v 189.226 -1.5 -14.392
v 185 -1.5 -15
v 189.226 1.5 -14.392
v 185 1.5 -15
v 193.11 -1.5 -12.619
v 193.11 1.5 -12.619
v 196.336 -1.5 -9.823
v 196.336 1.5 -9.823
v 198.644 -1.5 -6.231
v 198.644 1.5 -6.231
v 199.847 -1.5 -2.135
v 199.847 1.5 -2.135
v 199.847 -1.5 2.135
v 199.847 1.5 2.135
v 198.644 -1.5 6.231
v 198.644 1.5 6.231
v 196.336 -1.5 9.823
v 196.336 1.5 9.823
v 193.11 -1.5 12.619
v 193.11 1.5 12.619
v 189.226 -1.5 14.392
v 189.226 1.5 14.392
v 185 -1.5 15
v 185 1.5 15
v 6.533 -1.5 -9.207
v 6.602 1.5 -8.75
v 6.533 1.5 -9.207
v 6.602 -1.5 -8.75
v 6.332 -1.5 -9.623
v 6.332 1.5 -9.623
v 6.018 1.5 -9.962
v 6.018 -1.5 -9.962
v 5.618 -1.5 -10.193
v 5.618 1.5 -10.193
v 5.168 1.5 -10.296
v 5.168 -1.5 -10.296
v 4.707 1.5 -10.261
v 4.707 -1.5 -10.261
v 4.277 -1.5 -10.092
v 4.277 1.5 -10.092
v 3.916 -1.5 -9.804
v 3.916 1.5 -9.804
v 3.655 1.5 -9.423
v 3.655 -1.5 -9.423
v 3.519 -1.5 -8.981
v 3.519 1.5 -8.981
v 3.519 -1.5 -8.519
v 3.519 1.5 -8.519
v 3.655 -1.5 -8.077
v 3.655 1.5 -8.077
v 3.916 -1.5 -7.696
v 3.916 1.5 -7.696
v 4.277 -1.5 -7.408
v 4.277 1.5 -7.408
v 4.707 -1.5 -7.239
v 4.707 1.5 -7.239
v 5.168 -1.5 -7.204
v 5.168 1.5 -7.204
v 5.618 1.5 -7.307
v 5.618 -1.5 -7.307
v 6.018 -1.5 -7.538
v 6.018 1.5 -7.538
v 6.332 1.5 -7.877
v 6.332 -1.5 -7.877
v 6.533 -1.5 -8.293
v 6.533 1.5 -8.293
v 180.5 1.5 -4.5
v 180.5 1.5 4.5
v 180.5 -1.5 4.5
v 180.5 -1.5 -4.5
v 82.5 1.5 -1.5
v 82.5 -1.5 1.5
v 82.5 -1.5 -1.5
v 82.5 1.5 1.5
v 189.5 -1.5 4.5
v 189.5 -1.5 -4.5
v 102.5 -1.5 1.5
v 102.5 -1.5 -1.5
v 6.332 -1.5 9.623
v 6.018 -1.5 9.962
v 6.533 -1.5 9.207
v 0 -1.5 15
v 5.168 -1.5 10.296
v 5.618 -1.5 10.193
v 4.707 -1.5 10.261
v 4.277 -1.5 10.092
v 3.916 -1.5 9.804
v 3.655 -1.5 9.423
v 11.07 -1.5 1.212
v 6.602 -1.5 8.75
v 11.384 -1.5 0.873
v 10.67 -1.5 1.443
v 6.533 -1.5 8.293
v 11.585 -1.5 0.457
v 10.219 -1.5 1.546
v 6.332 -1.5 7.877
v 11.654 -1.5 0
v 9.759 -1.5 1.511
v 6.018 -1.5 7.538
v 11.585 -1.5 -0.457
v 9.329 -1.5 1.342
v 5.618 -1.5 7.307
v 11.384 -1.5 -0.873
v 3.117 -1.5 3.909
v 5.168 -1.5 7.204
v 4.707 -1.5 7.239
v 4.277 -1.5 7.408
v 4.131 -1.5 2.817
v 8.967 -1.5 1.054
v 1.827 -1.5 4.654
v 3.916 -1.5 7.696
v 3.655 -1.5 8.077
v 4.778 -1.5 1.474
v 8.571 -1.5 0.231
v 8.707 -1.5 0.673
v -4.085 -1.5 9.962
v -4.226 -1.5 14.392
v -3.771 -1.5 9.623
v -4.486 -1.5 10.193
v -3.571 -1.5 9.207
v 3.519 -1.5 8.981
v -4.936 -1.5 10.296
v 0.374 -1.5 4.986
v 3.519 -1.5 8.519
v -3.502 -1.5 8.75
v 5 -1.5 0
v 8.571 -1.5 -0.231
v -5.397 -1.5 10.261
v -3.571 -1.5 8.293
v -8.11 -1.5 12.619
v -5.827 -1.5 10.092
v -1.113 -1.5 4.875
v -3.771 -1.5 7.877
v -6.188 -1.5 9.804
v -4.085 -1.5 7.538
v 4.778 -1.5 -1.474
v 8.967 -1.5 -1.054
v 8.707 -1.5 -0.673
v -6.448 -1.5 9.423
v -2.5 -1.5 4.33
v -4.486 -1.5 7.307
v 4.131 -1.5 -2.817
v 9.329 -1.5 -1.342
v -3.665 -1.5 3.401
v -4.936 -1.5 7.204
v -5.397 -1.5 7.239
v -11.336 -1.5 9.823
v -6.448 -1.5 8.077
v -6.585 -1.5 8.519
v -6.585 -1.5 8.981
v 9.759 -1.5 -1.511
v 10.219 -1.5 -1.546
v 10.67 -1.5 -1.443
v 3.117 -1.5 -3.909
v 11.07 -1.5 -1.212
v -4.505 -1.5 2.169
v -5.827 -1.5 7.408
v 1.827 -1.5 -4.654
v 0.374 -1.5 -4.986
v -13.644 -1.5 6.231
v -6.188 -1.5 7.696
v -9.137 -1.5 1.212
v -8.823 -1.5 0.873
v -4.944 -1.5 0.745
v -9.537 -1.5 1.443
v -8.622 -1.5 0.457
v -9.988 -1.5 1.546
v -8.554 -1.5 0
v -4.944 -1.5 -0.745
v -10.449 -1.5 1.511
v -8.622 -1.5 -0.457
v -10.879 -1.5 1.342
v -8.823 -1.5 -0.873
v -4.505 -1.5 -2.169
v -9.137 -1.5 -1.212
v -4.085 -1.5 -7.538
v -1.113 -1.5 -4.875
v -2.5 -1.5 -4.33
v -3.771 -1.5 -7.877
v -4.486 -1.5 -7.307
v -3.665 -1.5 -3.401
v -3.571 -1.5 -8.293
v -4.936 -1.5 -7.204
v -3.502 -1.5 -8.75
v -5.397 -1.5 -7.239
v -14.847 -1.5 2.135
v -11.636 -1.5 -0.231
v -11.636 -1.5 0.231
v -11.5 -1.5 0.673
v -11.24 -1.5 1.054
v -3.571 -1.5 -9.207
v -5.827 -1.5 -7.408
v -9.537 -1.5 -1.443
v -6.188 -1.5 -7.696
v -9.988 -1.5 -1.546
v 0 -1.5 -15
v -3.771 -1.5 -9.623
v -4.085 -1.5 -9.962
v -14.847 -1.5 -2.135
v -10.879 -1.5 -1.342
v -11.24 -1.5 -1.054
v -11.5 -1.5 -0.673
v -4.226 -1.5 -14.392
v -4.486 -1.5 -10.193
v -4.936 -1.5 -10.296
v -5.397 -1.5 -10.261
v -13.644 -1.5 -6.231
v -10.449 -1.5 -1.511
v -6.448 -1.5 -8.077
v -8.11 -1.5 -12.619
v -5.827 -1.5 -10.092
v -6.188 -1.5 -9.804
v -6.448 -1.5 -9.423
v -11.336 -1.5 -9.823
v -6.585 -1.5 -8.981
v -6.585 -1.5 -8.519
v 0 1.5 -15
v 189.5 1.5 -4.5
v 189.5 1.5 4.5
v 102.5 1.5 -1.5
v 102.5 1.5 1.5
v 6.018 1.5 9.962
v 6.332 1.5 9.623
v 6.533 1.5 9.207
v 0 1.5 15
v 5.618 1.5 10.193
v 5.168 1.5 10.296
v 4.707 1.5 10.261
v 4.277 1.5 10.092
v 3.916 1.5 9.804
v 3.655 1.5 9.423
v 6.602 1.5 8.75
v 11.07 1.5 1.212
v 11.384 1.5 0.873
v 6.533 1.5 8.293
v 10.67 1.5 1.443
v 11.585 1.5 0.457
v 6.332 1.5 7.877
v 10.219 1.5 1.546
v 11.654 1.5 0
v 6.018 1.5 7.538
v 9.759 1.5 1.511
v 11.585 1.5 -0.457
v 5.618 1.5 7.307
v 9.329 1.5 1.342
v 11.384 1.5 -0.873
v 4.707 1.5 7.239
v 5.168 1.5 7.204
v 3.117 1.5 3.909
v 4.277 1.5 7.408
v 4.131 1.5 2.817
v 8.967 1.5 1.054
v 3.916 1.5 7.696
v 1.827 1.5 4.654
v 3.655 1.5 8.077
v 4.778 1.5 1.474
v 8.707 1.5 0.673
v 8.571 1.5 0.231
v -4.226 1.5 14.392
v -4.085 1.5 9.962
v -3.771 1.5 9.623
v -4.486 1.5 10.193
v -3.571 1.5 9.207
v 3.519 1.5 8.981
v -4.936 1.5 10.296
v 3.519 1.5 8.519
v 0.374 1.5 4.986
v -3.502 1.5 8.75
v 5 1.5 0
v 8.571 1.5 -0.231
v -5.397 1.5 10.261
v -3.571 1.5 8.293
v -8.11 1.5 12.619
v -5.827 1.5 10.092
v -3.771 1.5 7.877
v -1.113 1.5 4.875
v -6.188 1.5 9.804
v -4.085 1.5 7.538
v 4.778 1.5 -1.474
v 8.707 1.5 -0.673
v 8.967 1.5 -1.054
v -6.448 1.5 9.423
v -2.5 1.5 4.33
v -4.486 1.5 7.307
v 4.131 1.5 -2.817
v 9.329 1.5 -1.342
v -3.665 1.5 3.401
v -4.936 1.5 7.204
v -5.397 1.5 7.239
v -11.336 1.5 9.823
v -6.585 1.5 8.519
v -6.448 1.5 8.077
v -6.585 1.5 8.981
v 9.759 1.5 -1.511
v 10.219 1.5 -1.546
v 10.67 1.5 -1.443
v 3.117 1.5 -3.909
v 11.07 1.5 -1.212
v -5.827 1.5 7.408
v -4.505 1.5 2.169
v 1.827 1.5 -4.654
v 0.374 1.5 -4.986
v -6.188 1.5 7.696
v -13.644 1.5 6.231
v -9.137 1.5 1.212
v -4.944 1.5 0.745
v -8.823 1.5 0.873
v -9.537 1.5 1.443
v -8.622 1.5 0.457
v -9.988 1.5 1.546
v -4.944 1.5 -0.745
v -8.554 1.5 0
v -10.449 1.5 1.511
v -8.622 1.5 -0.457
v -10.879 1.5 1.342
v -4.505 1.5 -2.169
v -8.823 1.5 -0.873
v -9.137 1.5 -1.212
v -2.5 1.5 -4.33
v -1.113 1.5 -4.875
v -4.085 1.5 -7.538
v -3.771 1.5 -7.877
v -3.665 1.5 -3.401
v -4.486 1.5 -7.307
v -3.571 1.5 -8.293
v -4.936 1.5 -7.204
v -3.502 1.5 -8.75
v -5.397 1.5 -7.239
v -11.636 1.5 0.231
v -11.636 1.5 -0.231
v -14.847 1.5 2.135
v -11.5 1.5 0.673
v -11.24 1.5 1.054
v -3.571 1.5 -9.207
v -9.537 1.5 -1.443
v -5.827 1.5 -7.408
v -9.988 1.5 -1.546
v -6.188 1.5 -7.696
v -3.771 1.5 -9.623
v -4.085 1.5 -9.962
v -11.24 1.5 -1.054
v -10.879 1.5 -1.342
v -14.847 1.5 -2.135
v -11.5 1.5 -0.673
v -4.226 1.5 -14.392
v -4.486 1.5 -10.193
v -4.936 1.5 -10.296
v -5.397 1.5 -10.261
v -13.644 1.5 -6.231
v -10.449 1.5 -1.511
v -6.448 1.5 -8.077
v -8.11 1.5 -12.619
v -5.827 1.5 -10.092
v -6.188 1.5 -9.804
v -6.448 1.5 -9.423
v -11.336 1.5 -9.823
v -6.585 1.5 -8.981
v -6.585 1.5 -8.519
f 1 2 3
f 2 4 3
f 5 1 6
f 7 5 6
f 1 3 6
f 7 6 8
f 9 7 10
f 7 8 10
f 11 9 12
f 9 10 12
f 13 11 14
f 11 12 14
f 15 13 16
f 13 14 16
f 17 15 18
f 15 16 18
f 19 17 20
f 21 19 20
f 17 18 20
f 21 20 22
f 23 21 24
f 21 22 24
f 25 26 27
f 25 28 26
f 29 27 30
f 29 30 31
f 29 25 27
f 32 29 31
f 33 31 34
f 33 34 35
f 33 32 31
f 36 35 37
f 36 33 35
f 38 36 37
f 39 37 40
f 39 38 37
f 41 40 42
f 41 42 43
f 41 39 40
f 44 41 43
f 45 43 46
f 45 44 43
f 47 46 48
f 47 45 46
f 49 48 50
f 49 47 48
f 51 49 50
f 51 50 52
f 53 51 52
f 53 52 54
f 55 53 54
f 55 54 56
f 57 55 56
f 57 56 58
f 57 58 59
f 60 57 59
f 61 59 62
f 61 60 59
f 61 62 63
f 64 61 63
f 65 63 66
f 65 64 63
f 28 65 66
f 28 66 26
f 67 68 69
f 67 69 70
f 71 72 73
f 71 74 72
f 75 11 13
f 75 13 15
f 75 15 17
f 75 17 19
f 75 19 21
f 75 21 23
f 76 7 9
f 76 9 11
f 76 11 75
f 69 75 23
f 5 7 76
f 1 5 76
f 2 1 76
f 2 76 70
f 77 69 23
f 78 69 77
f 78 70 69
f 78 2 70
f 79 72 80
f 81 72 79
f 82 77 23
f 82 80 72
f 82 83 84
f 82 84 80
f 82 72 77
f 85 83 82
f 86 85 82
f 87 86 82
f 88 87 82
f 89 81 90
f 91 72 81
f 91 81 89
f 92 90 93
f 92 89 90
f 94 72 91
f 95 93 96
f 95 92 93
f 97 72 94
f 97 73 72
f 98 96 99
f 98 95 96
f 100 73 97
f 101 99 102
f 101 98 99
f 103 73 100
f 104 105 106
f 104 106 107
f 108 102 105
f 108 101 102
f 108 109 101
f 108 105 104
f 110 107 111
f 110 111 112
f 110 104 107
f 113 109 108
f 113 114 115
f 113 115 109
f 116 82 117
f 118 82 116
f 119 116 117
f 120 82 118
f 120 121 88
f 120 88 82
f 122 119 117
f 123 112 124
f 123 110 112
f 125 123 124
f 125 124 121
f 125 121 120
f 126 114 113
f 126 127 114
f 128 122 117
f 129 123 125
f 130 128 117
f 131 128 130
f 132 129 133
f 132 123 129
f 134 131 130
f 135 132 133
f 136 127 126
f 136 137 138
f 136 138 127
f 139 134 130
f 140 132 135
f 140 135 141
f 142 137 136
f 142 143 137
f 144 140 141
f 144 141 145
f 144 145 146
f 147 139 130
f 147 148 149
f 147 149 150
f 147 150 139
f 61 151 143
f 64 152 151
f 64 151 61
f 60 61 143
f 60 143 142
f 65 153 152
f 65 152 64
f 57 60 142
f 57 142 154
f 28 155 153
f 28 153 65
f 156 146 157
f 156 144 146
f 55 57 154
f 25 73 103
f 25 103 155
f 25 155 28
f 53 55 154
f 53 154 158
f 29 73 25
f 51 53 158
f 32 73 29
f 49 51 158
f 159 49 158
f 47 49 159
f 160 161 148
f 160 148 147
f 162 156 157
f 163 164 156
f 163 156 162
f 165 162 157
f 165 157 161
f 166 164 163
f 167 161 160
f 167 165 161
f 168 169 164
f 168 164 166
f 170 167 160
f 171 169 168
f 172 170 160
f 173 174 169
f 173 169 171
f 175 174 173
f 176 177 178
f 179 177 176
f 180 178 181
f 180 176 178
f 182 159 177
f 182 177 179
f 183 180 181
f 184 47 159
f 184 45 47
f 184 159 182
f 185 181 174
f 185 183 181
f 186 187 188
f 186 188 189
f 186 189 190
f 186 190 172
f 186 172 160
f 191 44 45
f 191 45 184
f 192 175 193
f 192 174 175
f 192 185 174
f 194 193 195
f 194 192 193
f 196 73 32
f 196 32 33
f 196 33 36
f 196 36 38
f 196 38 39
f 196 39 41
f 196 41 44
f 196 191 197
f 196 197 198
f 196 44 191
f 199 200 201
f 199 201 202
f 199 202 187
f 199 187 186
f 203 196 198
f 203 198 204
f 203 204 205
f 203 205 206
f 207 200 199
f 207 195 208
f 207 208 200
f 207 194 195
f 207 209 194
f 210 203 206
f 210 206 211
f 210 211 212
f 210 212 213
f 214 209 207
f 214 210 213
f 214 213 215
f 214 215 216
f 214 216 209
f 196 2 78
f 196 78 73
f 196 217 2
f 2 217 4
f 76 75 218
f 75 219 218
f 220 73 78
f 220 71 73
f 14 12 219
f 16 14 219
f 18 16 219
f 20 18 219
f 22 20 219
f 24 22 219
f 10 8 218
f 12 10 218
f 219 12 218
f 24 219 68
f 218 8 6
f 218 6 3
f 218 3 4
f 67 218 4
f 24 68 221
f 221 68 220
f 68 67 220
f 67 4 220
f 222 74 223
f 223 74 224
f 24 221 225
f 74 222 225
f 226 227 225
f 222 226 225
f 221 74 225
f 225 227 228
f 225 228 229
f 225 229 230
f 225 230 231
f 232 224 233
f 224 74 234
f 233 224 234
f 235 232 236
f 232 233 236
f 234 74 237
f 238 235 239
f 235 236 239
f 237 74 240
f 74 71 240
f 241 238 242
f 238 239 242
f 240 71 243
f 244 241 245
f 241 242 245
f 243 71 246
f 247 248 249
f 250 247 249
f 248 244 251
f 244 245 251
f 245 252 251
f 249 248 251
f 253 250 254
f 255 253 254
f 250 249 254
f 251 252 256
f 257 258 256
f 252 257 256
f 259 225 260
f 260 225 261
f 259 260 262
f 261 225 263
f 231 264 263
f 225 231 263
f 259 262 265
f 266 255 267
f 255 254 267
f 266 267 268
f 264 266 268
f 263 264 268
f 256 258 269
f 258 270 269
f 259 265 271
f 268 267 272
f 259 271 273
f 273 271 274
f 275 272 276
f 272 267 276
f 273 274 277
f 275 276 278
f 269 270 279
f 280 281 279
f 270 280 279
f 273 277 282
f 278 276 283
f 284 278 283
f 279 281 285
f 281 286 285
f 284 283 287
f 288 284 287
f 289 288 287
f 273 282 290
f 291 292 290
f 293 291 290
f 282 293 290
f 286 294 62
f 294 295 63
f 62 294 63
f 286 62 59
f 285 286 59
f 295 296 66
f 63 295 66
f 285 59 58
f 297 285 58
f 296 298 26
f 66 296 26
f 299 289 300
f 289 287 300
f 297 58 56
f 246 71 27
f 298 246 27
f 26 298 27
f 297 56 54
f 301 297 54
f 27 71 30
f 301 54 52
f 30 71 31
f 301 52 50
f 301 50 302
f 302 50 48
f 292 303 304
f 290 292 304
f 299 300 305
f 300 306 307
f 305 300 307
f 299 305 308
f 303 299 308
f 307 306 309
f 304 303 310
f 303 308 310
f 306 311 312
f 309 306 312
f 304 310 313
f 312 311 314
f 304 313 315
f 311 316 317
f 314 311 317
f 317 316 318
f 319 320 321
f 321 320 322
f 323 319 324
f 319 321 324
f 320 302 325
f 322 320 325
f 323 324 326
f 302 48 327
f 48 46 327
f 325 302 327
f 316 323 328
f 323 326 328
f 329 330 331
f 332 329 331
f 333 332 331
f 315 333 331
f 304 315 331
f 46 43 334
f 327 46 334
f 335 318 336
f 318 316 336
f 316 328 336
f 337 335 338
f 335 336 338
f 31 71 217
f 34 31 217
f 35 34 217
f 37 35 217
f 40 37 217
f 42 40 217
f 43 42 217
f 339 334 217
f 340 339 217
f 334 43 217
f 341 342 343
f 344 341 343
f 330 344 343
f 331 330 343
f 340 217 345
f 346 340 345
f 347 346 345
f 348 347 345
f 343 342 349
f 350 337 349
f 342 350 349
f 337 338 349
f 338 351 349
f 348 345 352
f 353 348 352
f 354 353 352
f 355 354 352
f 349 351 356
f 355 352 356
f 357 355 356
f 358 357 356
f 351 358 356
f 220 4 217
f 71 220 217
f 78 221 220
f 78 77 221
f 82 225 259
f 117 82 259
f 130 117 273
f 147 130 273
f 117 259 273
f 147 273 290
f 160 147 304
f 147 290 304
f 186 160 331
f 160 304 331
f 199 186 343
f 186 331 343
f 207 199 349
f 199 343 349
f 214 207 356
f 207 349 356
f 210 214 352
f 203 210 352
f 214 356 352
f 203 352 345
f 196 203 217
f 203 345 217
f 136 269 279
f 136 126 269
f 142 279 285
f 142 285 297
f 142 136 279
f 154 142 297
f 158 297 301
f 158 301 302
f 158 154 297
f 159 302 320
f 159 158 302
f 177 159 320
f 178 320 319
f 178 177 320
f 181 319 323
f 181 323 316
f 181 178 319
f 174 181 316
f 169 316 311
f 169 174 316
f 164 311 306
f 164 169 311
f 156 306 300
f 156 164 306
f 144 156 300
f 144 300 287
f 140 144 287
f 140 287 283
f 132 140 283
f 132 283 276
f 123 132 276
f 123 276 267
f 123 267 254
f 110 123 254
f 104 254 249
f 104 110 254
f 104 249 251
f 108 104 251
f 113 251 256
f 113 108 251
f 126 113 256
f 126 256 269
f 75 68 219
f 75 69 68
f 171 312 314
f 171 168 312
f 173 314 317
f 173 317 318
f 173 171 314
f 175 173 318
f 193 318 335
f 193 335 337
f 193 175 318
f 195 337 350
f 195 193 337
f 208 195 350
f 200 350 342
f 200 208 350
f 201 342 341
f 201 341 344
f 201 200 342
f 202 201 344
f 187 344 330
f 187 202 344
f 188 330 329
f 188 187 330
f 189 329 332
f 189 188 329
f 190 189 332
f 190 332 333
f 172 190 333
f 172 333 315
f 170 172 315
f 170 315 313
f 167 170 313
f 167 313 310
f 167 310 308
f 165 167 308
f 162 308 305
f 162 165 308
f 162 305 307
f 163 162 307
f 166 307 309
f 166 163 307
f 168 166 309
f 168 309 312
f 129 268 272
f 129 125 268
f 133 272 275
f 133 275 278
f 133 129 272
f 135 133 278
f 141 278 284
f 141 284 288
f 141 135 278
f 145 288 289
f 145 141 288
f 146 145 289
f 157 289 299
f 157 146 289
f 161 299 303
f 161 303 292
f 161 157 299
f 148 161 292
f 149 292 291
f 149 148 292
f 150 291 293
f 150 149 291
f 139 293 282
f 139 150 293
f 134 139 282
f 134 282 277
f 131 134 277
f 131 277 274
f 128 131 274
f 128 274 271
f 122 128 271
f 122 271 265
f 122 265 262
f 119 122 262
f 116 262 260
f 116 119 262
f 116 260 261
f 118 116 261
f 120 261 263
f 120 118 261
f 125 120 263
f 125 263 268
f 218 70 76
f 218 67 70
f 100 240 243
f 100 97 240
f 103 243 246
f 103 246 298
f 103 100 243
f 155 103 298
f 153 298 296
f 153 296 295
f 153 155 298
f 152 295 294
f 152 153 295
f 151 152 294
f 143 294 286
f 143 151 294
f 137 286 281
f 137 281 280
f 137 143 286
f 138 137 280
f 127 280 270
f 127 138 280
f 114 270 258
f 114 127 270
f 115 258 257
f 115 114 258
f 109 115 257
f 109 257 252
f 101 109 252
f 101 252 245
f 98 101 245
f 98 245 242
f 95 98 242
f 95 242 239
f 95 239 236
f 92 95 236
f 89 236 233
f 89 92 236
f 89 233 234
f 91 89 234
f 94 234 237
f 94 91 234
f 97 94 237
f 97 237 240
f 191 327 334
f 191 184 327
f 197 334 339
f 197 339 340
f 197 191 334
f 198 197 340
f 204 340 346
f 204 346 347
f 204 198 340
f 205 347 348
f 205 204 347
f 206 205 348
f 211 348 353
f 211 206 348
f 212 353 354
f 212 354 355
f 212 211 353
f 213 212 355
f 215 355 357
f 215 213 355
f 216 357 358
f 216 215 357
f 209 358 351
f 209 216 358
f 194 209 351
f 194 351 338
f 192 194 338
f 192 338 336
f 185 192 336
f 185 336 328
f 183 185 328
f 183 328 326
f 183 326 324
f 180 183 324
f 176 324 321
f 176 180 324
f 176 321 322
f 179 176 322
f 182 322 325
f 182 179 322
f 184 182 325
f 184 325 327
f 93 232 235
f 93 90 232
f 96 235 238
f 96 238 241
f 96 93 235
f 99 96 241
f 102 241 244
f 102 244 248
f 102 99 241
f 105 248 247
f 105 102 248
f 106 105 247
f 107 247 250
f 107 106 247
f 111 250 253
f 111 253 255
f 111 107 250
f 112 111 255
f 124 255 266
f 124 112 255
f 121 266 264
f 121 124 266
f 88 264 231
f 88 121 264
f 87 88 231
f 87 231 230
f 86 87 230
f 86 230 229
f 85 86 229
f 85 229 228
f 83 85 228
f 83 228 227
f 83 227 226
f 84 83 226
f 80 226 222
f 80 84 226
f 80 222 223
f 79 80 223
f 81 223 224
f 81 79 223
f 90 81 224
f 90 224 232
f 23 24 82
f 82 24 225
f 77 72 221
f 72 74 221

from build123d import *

# Parameters (mm, degrees)
SKETCH1_R           = 5
SKETCH1_R_2         = 1.55
SKETCH1_W           = 20
SKETCH1_H           = 3
SKETCH1_W_2         = 9
SKETCH1_H_2         = 9
BOSS_EXTRUDE1_DEPTH = 1.5


with BuildPart() as part:
    # Sketch1 → Boss-Extrude1 (new body, symmetric)
    with BuildSketch(Plane(origin=(0, 0, 0), x_dir=(1, 0, 0), z_dir=(0, 1, 0))):
        with BuildLine():
            Line((0, 15), (185, 15))
            ThreePointArc((185, 15), (200, 0), (185, -15))
            Line((185, -15), (0, -15))
            ThreePointArc((0, -15), (-15, 0), (0, 15))
        make_face()
        Circle(SKETCH1_R, mode=Mode.SUBTRACT)
        with Locations((5.051814855, 8.75)):
            Circle(SKETCH1_R_2, mode=Mode.SUBTRACT)
        with Locations((10.103629711, 0)):
            Circle(SKETCH1_R_2, mode=Mode.SUBTRACT)
        with Locations((5.051814855, -8.75)):
            Circle(SKETCH1_R_2, mode=Mode.SUBTRACT)
        with Locations((-5.051814855, -8.75)):
            Circle(SKETCH1_R_2, mode=Mode.SUBTRACT)
        with Locations((-10.103629711, 0)):
            Circle(SKETCH1_R_2, mode=Mode.SUBTRACT)
        with Locations((-5.051814855, 8.75)):
            Circle(SKETCH1_R_2, mode=Mode.SUBTRACT)
        with Locations((92.5, 0)):
            Rectangle(SKETCH1_W, SKETCH1_H, mode=Mode.SUBTRACT)
        with Locations((185, 0)):
            Rectangle(SKETCH1_W_2, SKETCH1_H_2, mode=Mode.SUBTRACT)
    extrude(amount=BOSS_EXTRUDE1_DEPTH, both=True)


solid = part.part
